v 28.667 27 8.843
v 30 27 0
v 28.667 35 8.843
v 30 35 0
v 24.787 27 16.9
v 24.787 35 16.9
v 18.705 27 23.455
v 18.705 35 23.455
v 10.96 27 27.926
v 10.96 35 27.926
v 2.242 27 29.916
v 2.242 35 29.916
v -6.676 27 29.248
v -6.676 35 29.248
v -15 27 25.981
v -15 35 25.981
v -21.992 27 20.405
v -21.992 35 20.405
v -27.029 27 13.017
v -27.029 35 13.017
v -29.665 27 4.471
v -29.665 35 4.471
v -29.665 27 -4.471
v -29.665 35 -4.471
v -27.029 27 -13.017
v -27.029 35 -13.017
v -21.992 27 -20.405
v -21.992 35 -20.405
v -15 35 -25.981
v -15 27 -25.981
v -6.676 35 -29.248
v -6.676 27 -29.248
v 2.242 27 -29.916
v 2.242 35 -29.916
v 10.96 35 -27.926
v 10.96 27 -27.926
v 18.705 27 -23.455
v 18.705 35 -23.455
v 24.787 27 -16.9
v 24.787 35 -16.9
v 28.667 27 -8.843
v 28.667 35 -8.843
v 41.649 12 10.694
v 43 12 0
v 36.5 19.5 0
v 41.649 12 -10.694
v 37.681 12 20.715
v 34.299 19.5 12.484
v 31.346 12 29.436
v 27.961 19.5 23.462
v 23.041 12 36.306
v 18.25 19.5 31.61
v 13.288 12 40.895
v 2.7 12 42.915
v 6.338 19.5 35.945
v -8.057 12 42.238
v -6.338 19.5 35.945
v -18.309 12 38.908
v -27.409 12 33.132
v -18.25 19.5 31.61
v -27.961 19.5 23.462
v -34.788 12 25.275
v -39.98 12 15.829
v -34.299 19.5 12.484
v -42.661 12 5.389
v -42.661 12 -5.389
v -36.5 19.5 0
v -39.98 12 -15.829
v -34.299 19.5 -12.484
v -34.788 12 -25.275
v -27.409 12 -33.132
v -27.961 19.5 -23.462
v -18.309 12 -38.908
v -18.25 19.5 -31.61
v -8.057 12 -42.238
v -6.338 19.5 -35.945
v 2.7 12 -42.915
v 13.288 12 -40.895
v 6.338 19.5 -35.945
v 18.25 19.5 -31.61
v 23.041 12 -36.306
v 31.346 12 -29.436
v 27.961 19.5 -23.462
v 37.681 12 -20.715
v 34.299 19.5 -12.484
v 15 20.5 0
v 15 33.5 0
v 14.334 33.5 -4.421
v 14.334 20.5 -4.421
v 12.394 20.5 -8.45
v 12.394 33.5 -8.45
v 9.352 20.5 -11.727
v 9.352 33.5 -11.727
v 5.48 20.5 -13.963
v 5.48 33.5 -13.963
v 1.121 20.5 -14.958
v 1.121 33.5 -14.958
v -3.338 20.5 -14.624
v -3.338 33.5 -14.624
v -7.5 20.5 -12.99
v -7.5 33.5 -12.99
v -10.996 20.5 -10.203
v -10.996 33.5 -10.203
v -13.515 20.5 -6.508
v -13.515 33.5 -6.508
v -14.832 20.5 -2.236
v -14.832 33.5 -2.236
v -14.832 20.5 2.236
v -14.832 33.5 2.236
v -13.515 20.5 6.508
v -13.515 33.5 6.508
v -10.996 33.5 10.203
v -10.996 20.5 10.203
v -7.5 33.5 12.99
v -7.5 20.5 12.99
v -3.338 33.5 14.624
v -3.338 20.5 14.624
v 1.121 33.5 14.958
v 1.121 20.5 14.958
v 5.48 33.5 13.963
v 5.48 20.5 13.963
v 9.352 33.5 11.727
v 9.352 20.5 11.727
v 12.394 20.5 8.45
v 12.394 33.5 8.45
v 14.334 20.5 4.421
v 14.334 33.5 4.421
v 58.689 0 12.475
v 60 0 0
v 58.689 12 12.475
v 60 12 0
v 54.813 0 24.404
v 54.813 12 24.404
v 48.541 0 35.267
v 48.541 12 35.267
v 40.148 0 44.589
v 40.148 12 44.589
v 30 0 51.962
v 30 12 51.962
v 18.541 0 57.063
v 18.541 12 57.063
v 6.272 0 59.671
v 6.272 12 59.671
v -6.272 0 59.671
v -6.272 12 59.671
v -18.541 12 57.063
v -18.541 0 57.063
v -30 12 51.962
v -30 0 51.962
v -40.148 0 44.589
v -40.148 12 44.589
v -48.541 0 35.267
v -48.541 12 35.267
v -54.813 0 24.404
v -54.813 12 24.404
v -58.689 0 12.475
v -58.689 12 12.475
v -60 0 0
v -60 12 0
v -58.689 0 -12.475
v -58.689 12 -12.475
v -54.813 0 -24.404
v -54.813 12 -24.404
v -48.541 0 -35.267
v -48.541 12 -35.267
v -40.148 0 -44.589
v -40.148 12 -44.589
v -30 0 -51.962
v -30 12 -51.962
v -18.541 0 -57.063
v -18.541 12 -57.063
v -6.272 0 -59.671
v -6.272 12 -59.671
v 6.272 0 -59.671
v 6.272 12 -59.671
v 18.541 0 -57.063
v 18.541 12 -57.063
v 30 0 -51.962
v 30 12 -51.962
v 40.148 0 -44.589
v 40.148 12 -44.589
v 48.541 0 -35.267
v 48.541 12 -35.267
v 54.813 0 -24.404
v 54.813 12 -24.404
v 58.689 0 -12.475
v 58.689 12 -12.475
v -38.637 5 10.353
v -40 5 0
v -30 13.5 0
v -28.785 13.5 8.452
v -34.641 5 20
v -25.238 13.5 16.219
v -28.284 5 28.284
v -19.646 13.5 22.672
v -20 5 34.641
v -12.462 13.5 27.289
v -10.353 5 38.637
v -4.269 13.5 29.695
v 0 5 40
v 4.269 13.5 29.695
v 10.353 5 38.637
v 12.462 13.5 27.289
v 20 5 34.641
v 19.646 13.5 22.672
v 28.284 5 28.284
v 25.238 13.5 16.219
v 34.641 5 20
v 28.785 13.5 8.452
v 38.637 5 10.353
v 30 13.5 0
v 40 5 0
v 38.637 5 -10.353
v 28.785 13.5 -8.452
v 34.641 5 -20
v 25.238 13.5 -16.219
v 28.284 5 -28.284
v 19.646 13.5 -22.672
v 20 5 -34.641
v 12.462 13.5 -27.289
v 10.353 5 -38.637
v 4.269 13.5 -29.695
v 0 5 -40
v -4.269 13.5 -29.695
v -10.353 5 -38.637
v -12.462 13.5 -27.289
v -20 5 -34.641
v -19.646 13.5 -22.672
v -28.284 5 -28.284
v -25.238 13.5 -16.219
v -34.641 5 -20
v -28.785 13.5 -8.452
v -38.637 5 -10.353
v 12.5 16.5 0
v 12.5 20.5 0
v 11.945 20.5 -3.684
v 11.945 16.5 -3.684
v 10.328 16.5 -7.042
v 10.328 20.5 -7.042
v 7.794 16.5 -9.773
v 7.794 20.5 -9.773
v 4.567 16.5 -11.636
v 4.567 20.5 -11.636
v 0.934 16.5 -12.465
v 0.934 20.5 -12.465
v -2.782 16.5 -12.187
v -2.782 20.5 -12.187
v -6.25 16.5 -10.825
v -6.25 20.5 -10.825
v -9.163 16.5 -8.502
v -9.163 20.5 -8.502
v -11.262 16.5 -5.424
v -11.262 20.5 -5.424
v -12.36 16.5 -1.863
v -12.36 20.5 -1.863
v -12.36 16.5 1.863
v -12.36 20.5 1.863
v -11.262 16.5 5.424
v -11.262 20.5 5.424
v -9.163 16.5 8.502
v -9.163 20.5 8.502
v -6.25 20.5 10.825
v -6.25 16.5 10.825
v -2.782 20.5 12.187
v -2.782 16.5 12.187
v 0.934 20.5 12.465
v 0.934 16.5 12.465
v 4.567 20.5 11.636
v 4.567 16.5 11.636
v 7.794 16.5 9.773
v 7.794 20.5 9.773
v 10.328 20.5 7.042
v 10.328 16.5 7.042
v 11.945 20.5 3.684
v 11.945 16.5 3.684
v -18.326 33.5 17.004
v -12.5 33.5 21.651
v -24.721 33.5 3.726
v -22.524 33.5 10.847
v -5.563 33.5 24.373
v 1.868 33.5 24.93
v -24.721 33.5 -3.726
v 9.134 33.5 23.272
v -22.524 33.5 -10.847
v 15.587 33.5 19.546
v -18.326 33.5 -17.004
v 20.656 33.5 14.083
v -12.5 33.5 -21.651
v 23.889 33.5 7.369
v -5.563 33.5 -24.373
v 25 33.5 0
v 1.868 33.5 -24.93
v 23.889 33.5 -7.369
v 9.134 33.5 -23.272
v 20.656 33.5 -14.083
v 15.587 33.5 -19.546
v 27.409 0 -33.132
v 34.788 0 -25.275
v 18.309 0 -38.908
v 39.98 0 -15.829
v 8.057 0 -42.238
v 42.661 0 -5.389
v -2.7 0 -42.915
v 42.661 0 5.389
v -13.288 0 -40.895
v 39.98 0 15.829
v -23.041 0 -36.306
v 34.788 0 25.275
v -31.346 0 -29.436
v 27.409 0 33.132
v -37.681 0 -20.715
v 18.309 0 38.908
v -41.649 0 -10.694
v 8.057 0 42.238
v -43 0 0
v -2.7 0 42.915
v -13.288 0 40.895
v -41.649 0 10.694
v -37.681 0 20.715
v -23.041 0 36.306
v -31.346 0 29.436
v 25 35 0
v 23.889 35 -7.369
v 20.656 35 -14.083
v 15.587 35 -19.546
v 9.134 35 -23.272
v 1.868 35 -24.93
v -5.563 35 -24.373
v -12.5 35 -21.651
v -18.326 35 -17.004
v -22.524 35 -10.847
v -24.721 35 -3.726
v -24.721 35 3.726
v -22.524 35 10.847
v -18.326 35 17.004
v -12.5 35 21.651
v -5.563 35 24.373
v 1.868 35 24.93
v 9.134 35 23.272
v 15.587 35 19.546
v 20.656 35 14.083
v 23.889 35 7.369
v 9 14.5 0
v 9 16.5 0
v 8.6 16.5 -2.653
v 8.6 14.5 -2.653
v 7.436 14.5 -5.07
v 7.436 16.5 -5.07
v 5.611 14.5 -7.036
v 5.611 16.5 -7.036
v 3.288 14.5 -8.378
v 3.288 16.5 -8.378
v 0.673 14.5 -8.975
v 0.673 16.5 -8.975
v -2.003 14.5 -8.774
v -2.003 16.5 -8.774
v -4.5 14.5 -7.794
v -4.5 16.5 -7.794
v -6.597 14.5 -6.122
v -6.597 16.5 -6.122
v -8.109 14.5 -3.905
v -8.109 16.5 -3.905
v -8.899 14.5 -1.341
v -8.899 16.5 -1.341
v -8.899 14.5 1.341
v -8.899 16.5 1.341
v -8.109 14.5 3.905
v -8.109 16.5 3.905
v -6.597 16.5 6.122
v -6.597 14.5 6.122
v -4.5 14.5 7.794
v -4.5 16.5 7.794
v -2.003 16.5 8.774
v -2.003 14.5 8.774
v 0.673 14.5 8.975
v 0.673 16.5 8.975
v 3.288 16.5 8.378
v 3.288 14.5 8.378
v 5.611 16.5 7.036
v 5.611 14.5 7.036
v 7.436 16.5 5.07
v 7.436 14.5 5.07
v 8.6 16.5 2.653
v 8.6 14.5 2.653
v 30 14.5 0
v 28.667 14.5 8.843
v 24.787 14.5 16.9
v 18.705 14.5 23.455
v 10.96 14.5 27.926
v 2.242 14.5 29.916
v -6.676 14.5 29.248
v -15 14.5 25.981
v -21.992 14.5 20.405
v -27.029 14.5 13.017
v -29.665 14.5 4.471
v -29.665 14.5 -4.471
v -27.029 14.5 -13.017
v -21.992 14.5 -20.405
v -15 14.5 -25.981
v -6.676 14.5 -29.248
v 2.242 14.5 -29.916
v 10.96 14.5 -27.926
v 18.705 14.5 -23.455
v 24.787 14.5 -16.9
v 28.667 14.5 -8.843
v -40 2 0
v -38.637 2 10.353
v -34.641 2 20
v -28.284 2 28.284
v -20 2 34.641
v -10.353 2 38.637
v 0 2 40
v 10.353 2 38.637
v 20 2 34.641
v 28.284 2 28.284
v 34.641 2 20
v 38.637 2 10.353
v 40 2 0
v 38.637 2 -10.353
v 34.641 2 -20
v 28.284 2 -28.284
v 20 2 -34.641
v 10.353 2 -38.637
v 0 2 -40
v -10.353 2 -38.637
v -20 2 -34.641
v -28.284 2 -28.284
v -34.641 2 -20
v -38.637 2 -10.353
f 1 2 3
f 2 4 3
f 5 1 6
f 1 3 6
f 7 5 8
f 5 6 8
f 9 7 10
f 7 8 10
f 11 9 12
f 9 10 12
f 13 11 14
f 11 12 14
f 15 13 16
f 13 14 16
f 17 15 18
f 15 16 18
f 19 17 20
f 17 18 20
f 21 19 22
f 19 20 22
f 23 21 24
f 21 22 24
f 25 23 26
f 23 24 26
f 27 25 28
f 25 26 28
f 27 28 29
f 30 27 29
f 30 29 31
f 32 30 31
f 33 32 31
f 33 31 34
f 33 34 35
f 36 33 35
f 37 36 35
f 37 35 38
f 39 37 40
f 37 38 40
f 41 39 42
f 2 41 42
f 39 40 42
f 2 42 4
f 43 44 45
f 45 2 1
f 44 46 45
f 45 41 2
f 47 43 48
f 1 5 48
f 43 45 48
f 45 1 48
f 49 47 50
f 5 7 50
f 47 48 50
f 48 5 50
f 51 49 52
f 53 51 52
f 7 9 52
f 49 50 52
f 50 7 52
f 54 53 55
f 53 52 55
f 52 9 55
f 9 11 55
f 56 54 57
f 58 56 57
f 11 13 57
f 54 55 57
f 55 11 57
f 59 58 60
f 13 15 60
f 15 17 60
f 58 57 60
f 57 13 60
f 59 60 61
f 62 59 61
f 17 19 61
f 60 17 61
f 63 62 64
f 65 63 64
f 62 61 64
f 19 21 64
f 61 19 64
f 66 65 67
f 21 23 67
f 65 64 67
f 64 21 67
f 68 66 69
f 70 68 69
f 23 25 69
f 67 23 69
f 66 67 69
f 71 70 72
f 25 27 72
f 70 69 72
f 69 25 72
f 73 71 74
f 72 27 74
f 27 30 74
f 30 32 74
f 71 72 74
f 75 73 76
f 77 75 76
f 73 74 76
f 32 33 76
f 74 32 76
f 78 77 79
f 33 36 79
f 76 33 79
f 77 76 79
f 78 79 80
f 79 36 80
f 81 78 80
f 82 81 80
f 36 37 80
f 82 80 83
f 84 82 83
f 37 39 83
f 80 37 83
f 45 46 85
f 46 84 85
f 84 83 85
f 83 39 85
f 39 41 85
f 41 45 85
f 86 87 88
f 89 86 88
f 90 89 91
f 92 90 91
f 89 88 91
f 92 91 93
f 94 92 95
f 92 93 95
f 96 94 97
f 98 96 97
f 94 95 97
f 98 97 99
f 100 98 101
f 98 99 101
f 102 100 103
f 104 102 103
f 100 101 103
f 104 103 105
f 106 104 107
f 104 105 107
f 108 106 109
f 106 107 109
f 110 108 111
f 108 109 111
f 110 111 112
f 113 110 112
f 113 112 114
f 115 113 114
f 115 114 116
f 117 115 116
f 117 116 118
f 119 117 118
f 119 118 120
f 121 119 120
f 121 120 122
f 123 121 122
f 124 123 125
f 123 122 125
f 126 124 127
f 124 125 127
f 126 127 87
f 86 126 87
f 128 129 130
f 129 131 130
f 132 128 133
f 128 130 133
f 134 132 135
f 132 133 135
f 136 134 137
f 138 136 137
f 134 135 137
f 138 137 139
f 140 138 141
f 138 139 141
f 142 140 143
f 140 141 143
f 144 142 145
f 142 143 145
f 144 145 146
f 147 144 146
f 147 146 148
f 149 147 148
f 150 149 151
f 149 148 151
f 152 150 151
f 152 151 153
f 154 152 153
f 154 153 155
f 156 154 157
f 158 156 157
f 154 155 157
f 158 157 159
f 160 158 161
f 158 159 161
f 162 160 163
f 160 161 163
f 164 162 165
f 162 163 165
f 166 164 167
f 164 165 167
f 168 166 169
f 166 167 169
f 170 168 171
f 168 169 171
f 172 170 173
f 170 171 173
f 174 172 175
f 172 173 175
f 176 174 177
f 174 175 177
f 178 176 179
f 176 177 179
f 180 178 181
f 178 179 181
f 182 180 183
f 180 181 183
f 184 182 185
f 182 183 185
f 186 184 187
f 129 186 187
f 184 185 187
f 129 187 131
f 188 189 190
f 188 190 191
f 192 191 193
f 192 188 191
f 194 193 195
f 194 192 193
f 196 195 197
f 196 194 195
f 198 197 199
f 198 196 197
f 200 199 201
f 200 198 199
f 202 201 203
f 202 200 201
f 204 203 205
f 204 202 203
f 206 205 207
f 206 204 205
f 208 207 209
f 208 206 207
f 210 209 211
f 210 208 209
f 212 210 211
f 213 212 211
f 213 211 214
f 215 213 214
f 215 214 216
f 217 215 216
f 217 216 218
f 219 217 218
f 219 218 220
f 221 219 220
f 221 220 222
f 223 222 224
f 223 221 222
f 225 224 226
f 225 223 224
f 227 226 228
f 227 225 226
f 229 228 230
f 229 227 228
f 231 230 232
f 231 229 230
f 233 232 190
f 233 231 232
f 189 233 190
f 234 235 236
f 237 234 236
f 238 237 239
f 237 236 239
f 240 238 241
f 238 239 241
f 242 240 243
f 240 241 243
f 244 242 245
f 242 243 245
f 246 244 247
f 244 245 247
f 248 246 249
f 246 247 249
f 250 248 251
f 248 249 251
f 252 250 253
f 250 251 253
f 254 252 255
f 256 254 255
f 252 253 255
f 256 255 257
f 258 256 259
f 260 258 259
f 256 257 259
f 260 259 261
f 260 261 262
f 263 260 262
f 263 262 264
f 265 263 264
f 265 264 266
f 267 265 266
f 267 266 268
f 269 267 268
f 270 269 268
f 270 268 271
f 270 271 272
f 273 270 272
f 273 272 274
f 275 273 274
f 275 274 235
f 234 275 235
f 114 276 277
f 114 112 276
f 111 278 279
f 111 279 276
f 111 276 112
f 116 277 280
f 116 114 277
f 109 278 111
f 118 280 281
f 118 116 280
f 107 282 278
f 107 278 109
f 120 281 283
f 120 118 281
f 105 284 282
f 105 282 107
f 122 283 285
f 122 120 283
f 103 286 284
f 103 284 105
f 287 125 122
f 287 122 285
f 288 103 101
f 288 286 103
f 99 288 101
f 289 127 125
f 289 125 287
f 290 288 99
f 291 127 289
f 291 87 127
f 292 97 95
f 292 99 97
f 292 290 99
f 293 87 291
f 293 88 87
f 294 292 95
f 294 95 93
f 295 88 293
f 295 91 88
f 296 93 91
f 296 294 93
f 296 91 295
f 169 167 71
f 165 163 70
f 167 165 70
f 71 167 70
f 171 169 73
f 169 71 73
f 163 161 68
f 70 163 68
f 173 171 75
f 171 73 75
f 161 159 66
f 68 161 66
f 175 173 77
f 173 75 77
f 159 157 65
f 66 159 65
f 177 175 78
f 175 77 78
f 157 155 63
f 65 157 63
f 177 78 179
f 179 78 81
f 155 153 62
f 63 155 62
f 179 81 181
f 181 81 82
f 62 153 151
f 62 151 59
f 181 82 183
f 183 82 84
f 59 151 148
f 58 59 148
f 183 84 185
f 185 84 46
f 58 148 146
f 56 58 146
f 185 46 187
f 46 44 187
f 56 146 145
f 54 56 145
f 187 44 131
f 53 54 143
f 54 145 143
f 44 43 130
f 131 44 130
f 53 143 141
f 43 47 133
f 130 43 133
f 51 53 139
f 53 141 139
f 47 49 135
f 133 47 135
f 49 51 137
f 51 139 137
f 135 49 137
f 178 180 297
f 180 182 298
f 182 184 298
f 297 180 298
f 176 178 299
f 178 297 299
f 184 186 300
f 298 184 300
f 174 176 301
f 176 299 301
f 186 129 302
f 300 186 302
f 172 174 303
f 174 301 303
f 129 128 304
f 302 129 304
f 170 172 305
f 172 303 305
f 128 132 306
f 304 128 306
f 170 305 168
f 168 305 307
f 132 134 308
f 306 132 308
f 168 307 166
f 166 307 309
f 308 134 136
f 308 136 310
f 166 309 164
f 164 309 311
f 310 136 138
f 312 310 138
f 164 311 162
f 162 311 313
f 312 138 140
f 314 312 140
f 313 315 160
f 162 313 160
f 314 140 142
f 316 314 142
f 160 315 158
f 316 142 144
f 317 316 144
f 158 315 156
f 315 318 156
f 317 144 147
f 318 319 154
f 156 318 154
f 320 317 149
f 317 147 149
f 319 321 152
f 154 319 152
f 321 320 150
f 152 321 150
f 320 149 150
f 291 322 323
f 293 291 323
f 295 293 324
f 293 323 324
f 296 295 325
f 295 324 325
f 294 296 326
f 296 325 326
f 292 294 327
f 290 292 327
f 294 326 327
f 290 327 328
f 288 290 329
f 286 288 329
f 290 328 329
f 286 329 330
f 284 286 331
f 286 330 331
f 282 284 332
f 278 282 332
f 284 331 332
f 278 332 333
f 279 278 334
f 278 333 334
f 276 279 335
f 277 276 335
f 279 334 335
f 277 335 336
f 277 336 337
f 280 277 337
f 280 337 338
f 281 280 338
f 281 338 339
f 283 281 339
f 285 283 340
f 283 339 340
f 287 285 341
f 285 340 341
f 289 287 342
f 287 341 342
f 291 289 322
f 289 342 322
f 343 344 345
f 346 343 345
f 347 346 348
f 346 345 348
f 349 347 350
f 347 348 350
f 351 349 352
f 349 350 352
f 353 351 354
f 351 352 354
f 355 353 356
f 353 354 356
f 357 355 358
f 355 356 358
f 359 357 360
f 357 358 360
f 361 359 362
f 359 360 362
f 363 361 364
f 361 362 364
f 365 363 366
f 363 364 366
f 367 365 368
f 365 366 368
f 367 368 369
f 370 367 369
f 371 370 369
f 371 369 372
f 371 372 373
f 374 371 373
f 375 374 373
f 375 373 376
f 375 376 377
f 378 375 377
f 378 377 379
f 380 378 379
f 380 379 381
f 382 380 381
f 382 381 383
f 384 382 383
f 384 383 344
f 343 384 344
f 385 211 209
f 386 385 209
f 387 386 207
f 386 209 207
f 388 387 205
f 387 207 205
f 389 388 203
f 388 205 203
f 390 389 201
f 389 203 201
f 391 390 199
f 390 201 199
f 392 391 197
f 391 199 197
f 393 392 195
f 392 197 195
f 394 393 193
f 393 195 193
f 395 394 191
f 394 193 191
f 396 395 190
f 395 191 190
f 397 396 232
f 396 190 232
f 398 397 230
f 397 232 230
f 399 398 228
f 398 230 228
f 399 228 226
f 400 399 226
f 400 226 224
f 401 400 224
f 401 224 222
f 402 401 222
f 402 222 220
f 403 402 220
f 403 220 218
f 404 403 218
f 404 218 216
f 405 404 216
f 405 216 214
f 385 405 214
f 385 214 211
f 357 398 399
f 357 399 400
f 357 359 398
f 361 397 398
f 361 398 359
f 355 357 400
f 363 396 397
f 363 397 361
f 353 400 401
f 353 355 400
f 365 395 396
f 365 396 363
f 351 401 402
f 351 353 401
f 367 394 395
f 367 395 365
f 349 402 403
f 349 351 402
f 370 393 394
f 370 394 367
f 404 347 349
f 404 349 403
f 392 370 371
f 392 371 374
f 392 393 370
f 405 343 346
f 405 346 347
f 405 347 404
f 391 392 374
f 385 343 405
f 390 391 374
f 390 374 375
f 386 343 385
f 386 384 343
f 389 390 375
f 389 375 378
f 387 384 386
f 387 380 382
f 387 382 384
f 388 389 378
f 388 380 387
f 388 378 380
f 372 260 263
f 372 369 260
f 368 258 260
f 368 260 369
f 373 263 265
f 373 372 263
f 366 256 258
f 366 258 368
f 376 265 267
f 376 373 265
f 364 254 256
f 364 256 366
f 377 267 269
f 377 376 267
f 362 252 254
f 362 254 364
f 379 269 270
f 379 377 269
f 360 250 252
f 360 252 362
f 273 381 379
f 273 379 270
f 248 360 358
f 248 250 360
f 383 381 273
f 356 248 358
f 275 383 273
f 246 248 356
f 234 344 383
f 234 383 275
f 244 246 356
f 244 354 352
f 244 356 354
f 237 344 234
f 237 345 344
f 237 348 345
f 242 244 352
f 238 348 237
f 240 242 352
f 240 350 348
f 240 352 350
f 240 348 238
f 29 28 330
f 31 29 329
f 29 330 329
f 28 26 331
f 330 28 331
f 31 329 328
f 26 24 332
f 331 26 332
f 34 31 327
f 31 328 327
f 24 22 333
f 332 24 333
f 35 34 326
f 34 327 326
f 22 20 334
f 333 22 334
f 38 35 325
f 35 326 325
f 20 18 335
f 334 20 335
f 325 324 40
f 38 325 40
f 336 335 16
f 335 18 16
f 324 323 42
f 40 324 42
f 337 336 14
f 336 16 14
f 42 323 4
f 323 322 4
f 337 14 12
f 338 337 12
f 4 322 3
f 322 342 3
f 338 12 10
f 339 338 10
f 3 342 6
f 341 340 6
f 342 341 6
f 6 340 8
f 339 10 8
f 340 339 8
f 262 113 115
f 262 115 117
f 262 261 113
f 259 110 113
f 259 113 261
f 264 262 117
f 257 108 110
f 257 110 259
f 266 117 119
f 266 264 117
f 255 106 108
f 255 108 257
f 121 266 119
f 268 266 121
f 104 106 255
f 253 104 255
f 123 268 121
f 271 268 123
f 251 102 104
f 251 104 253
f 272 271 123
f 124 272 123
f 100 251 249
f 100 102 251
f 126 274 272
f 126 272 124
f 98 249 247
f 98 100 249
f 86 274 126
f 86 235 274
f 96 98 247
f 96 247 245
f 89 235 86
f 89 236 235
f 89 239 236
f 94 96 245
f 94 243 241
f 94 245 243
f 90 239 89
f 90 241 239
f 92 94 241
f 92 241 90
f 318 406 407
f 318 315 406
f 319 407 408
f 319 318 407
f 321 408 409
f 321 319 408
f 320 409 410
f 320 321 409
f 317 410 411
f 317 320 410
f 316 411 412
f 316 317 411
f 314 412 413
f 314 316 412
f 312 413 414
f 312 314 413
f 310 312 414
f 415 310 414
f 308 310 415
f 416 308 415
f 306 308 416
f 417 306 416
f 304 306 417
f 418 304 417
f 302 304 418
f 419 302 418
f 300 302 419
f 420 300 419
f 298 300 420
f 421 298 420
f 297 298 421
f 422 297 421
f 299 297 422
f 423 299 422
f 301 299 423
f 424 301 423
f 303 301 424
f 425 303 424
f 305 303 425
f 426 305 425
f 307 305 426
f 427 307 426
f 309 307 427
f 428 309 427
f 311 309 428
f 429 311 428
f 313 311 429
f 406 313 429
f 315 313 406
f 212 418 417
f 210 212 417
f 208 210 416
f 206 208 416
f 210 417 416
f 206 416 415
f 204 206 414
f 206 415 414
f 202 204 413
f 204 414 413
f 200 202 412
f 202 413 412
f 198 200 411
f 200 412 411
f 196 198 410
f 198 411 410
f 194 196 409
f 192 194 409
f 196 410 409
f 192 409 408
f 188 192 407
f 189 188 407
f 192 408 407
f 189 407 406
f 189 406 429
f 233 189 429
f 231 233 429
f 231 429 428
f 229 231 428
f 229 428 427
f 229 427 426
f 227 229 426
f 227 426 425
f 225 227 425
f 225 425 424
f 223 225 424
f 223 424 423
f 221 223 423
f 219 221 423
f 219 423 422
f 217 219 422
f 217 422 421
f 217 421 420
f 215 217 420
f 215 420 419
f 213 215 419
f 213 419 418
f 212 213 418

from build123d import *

# Parameters (mm, degrees)
CROQUIS2_R            = 43
CORTAR_EXTRUIR1_DEPTH = 2
CROQUIS4_R            = 40
CORTAR_EXTRUIR2_DEPTH = 3
CROQUIS6_R            = 30
CORTAR_EXTRUIR3_DEPTH = 8.5
CROQUIS8_R            = 30
CORTAR_EXTRUIR4_DEPTH = 1
CROQUIS9_R            = 25
CORTAR_EXTRUIR5_DEPTH = 1.5
CROQUIS10_R           = 15
CORTAR_EXTRUIR6_DEPTH = 13
CROQUIS11_R           = 12.5
CORTAR_EXTRUIR7_DEPTH = 18.5
CROQUIS12_R           = 9
CORTAR_EXTRUIR8_DEPTH = 22.5


with BuildPart() as part:
    # Croquis1 → Revolución1 (revolve)
    with BuildSketch(Plane.XY):
        Polygon((0, 0), (60, 0), (60, 12), (43, 12), (30, 27), (30, 35), (0, 35), align=None)
    revolve(axis=Axis((0, 35, 0), (0, -1, 0)))

    # Croquis2 → Cortar-Extruir1 (cut)
    with BuildSketch(Plane.XZ):
        Circle(CROQUIS2_R)
    extrude(amount=-CORTAR_EXTRUIR1_DEPTH, mode=Mode.SUBTRACT)

    # Croquis4 → Cortar-Extruir2 (cut)
    with BuildSketch(Plane.XZ.offset(-2)):
        Circle(CROQUIS4_R)
    extrude(amount=-CORTAR_EXTRUIR2_DEPTH, mode=Mode.SUBTRACT)

    # Croquis5 → Revolución2 (revolve)
    with BuildSketch(Plane.XY):
        Polygon((-40, 2), (-43, 0), (-43, 2), align=None)
    revolve(axis=Axis((0, 0, 0), (0, 1, 0)))

    # Croquis6 → Cortar-Extruir3 (cut)
    with BuildSketch(Plane.XZ.offset(-5)):
        Circle(CROQUIS6_R)
    extrude(amount=-CORTAR_EXTRUIR3_DEPTH, mode=Mode.SUBTRACT)

    # Croquis7 → Cortar-Revolución1 (revolve, cut)
    with BuildSketch(Plane.XY):
        Polygon((-40, 5), (-30, 5), (-30, 13.5), align=None)
    revolve(axis=Axis((0, 0, 0), (0, 1, 0)), mode=Mode.SUBTRACT)

    # Croquis8 → Cortar-Extruir4 (cut)
    with BuildSketch(Plane.XZ.offset(-13.5)):
        Circle(CROQUIS8_R)
    extrude(amount=-CORTAR_EXTRUIR4_DEPTH, mode=Mode.SUBTRACT)

    # Croquis9 → Cortar-Extruir5 (cut)
    with BuildSketch(Plane(origin=(0, 35, 0), x_dir=(1, 0, 0), z_dir=(0, 1, 0))):
        Circle(CROQUIS9_R)
    extrude(amount=-CORTAR_EXTRUIR5_DEPTH, mode=Mode.SUBTRACT)

    # Croquis10 → Cortar-Extruir6 (cut)
    with BuildSketch(Plane(origin=(0, 33.5, 0), x_dir=(1, 0, 0), z_dir=(0, 1, 0))):
        Circle(CROQUIS10_R)
    extrude(amount=-CORTAR_EXTRUIR6_DEPTH, mode=Mode.SUBTRACT)

    # Croquis11 → Cortar-Extruir7 (cut)
    with BuildSketch(Plane(origin=(0, 35, 0), x_dir=(1, 0, 0), z_dir=(0, 1, 0))):
        Circle(CROQUIS11_R)
    extrude(amount=-CORTAR_EXTRUIR7_DEPTH, mode=Mode.SUBTRACT)

    # Croquis12 → Cortar-Extruir8 (cut)
    with BuildSketch(Plane(origin=(0, 35, 0), x_dir=(1, 0, 0), z_dir=(0, 1, 0))):
        Circle(CROQUIS12_R)
    extrude(amount=-CORTAR_EXTRUIR8_DEPTH, mode=Mode.SUBTRACT)


solid = part.part
